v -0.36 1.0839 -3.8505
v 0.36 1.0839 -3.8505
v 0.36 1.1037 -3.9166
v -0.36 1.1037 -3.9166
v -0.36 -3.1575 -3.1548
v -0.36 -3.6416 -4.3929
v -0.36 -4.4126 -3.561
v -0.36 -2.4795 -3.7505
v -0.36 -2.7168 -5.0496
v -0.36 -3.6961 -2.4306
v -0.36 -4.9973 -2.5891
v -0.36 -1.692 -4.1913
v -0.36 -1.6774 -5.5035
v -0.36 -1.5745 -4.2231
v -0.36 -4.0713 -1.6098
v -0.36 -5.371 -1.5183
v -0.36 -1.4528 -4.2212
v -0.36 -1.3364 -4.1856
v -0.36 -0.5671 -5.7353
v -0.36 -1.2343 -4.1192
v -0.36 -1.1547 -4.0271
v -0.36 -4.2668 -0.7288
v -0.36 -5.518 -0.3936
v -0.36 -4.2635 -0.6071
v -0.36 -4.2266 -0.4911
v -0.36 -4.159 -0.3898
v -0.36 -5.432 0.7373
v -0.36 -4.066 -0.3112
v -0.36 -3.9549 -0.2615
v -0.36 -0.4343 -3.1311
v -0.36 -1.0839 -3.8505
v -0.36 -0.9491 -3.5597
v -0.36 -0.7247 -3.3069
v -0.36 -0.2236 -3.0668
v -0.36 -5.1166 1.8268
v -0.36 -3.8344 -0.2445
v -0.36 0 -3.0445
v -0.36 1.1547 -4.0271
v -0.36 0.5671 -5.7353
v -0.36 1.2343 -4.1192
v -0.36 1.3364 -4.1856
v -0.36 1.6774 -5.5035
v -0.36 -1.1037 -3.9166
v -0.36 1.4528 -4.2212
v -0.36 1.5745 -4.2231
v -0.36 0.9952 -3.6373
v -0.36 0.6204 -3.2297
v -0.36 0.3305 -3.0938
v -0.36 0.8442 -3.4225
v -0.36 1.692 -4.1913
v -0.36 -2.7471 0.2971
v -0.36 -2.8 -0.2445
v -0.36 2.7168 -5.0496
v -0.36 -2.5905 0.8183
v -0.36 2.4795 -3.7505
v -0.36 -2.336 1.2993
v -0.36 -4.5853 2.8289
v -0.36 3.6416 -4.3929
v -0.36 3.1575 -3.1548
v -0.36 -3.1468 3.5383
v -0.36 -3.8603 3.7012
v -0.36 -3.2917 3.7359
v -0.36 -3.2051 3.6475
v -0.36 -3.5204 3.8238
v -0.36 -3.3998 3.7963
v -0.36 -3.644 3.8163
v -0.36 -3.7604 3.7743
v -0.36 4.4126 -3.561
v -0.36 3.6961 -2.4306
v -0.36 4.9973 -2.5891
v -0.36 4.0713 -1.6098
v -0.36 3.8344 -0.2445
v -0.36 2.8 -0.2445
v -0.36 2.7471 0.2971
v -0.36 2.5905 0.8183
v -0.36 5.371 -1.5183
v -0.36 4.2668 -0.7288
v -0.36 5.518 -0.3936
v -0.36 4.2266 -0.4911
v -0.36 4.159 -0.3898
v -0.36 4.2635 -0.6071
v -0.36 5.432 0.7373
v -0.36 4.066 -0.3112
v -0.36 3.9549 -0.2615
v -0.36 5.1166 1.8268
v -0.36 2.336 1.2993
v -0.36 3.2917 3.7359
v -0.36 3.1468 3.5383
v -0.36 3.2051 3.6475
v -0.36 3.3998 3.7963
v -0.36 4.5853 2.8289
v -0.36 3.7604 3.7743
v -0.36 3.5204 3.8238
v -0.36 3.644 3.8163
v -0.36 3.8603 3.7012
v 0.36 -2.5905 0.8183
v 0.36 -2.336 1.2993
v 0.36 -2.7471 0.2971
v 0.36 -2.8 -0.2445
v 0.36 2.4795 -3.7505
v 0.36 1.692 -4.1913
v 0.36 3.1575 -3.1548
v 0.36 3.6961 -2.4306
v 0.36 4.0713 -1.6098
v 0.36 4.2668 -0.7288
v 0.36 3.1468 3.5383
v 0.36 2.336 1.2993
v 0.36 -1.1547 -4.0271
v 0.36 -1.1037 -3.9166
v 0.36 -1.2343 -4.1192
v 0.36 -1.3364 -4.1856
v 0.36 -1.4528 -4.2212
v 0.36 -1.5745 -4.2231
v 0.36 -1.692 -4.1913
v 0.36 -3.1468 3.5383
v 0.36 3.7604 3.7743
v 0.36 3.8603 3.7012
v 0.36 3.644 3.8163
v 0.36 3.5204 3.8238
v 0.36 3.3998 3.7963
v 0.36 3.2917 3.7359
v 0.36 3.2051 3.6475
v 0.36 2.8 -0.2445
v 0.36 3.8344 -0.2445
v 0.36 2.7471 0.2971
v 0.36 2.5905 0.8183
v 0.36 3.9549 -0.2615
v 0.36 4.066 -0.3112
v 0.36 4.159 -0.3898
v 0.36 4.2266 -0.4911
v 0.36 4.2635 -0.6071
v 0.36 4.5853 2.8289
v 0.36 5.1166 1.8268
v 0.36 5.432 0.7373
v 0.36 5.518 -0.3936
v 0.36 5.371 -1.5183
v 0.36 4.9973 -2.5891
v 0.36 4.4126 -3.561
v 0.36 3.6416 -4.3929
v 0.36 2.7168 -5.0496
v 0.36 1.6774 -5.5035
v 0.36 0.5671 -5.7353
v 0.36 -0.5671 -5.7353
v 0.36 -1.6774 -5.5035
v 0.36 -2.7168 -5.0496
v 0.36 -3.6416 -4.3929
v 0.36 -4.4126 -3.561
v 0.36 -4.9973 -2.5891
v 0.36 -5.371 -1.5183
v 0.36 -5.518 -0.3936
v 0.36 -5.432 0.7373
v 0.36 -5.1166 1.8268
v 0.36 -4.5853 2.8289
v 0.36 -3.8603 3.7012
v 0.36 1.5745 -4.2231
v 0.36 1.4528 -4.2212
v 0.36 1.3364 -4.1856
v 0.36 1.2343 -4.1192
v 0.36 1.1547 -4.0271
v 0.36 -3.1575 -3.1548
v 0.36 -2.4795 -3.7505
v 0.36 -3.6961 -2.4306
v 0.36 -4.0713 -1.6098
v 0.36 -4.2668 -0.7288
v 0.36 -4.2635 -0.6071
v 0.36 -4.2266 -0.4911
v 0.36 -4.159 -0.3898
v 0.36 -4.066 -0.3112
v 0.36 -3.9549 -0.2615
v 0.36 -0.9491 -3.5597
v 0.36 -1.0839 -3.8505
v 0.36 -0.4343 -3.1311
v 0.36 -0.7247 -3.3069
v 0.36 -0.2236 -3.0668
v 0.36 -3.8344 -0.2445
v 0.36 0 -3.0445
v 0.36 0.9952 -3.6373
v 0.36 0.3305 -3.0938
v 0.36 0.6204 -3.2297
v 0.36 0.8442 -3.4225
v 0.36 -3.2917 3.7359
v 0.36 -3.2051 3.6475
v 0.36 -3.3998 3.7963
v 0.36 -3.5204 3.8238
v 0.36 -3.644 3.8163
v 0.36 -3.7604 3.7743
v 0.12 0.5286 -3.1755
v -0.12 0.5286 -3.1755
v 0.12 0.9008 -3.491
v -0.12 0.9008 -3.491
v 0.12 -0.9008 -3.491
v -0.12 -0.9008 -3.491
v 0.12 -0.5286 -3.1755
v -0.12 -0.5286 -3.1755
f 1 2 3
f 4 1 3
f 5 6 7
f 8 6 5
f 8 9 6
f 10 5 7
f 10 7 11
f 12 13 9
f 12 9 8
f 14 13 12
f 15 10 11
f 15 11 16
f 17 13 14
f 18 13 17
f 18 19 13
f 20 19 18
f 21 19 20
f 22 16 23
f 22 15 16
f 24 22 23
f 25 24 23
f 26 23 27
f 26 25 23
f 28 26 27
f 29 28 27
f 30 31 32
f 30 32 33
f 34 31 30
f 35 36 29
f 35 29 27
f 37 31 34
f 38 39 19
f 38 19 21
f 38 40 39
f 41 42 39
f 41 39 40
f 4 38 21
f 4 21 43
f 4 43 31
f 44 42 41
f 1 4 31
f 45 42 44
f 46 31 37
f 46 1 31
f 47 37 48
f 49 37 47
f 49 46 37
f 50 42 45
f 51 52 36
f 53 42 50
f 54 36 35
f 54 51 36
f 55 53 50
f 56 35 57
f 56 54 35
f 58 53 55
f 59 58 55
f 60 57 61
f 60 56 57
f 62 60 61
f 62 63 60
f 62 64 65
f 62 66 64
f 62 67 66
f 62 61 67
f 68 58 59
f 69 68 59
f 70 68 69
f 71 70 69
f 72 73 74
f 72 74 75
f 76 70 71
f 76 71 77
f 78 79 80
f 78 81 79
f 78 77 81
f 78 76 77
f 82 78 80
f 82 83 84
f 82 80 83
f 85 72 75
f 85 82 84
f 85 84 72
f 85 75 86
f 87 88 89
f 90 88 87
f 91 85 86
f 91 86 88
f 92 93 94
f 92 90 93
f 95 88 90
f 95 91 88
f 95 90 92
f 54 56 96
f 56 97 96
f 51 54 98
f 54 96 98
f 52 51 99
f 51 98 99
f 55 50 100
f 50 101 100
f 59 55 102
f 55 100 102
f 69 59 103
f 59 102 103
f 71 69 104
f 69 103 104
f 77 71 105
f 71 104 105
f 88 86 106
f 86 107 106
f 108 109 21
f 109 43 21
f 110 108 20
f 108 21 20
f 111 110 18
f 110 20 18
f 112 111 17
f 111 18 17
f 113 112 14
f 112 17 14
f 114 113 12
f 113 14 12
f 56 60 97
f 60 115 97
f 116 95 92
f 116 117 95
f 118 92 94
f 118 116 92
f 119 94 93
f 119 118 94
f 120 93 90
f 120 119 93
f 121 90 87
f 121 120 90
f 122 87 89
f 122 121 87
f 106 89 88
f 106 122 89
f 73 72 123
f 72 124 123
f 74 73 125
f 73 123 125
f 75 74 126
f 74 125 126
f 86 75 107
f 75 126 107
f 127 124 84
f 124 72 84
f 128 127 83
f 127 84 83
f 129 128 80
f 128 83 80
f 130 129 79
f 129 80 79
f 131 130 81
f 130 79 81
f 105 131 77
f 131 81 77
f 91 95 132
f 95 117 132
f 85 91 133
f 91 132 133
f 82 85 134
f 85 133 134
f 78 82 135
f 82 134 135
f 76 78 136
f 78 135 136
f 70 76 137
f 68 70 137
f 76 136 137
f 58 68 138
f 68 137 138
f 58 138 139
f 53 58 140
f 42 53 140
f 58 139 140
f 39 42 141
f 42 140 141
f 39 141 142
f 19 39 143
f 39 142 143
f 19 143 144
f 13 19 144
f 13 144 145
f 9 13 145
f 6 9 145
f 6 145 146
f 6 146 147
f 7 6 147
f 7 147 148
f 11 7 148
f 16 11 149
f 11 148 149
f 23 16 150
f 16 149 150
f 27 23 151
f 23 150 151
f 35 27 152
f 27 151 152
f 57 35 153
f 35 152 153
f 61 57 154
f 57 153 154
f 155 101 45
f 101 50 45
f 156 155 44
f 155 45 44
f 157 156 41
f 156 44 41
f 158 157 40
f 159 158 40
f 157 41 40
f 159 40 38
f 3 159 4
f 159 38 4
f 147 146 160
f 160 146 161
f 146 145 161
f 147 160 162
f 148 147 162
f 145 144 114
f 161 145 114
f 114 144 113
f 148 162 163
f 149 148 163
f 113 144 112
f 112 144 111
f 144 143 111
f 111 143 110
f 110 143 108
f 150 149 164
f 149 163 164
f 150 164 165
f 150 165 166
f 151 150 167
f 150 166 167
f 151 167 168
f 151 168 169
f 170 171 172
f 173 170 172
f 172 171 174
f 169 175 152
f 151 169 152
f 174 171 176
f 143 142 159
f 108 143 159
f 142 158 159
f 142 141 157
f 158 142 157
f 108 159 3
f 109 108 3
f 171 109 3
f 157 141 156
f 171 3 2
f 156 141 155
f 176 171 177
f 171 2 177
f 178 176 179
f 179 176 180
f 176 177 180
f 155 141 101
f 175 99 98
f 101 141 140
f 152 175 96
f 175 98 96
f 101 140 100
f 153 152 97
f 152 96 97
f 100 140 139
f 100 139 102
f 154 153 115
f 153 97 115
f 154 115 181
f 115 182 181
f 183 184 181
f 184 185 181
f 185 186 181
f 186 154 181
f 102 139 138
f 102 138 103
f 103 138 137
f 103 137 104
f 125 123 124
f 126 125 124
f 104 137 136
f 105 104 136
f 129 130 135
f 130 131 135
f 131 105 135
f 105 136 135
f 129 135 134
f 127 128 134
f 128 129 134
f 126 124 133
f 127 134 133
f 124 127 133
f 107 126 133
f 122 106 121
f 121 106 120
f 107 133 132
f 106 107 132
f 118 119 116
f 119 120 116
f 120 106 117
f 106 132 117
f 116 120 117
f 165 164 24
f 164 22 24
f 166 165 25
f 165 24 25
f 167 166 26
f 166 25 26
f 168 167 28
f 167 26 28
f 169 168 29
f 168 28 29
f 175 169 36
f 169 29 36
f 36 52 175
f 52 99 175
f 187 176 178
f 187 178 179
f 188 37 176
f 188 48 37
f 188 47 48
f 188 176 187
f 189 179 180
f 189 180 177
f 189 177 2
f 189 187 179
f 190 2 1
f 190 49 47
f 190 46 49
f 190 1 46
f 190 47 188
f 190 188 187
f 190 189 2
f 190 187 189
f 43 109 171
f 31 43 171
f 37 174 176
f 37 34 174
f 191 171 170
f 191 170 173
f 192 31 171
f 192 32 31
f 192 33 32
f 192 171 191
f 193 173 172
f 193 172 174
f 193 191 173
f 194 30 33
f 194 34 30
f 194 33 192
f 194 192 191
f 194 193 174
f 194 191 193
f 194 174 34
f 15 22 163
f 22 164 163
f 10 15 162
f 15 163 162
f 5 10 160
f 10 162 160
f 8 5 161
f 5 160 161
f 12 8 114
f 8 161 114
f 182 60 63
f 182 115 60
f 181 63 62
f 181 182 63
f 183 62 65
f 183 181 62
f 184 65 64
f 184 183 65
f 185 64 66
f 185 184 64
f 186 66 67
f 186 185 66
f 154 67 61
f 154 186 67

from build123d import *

# Parameters (mm, degrees)
EXTRUDE1_DEPTH = 0.45
FILLET2_START  = -0.45
FILLET2_DEPTH  = 0.9
FILLET1_R      = 0.544
SCALE1_SCALE   = 0.8


with BuildPart() as part:
    # Sketch1 → Extrude1 (new, symmetric)
    with BuildSketch(Plane(origin=(0, 0, 0), x_dir=(0, 0, -1), z_dir=(1, 0, 0))):
        with BuildLine():
            Line((-5.472300811, -4.20284711), (-1.929663183, -2.92))
            ThreePointArc((-1.929663183, -2.92), (-1.007472084, -3.351865152), (0, -3.5))
            Line((0, -3.5), (0, -5.367741935))
            ThreePointArc((0, -5.367741935), (3.203041928, -4.30733977), (5.140556326, -1.545100044))
            Line((5.140556326, -1.545100044), (3.351865152, -1.007472084))
            ThreePointArc((3.351865152, -1.007472084), (3.5, 0), (3.351865152, 1.007472084))
            Line((3.351865152, 1.007472084), (5.140556326, 1.545100044))
            ThreePointArc((5.140556326, 1.545100044), (3.203041928, 4.30733977), (0, 5.367741935))
            Line((0, 5.367741935), (0, 3.5))
            ThreePointArc((0, 3.5), (-1.007472084, 3.351865152), (-1.929663183, 2.92))
            Line((-1.929663183, 2.92), (-5.472300811, 4.20284711))
            ThreePointArc((-5.472300811, 4.20284711), (6.9, 0), (-5.472300811, -4.20284711))
        make_face()
    extrude(amount=EXTRUDE1_DEPTH, both=True)

    # Fillet2: read off the stored shape, not the designer's step
    # Fillet2 outline → Fillet2 (cut)
    with BuildSketch(Plane.YZ.offset(FILLET2_START)):
        with BuildLine():
            Line((-1.007472084, -3.351865152), (-1.35481354, -4.507472084))
            add(Edge.make_bspline(
                [(-1.35481354, -4.507472084), (-1.184355647, -3.940357738), (-0.701331375, -3.5), (0, -3.5)],
                knots=[0, 0, 0, 0, 0.5, 0.5, 0.5, 0.5], degree=3, weights=[1, 0.762616389, 0.643924583, 0.643924583]))
            ThreePointArc((0, -3.5), (-0.509152219, -3.462768259), (-1.007472084, -3.351865152))
        make_face()
        with BuildLine():
            ThreePointArc((1.007472084, -3.351865152), (0.509152221, -3.462768259), (2e-09, -3.5))
            add(Edge.make_bspline(
                [(2e-09, -3.5), (0.701331375, -3.5), (1.184355647, -3.940357738), (1.35481354, -4.507472084)],
                knots=[0.5, 0.5, 0.5, 0.5, 1, 1, 1, 1], degree=3, weights=[0.643924583, 0.643924583, 0.762616389, 1]))
            Line((1.35481354, -4.507472084), (1.007472084, -3.351865152))
        make_face()
    extrude(amount=FILLET2_DEPTH, mode=Mode.SUBTRACT)

    # Fillet1
    fillet1_edges = [part.edges().sort_by_distance(p)[0] for p in [
        (0, -5.367741935, 0),
        (0, 5.367741935, 0),
        (0, -4.20284711, 5.472300811),
        (0, 4.20284711, 5.472300811),
        (0, -1.545100044, -5.140556326),
        (0, 1.545100044, -5.140556326),
    ]]
    fillet(fillet1_edges, radius=FILLET1_R)


with BuildPart() as part_1:
    # Scale1: scaled about (0, 0, -1.222397064)
    add(part.part.scale(SCALE1_SCALE).moved(Location((0, 0, -0.244479413))))


solid = part_1.part
